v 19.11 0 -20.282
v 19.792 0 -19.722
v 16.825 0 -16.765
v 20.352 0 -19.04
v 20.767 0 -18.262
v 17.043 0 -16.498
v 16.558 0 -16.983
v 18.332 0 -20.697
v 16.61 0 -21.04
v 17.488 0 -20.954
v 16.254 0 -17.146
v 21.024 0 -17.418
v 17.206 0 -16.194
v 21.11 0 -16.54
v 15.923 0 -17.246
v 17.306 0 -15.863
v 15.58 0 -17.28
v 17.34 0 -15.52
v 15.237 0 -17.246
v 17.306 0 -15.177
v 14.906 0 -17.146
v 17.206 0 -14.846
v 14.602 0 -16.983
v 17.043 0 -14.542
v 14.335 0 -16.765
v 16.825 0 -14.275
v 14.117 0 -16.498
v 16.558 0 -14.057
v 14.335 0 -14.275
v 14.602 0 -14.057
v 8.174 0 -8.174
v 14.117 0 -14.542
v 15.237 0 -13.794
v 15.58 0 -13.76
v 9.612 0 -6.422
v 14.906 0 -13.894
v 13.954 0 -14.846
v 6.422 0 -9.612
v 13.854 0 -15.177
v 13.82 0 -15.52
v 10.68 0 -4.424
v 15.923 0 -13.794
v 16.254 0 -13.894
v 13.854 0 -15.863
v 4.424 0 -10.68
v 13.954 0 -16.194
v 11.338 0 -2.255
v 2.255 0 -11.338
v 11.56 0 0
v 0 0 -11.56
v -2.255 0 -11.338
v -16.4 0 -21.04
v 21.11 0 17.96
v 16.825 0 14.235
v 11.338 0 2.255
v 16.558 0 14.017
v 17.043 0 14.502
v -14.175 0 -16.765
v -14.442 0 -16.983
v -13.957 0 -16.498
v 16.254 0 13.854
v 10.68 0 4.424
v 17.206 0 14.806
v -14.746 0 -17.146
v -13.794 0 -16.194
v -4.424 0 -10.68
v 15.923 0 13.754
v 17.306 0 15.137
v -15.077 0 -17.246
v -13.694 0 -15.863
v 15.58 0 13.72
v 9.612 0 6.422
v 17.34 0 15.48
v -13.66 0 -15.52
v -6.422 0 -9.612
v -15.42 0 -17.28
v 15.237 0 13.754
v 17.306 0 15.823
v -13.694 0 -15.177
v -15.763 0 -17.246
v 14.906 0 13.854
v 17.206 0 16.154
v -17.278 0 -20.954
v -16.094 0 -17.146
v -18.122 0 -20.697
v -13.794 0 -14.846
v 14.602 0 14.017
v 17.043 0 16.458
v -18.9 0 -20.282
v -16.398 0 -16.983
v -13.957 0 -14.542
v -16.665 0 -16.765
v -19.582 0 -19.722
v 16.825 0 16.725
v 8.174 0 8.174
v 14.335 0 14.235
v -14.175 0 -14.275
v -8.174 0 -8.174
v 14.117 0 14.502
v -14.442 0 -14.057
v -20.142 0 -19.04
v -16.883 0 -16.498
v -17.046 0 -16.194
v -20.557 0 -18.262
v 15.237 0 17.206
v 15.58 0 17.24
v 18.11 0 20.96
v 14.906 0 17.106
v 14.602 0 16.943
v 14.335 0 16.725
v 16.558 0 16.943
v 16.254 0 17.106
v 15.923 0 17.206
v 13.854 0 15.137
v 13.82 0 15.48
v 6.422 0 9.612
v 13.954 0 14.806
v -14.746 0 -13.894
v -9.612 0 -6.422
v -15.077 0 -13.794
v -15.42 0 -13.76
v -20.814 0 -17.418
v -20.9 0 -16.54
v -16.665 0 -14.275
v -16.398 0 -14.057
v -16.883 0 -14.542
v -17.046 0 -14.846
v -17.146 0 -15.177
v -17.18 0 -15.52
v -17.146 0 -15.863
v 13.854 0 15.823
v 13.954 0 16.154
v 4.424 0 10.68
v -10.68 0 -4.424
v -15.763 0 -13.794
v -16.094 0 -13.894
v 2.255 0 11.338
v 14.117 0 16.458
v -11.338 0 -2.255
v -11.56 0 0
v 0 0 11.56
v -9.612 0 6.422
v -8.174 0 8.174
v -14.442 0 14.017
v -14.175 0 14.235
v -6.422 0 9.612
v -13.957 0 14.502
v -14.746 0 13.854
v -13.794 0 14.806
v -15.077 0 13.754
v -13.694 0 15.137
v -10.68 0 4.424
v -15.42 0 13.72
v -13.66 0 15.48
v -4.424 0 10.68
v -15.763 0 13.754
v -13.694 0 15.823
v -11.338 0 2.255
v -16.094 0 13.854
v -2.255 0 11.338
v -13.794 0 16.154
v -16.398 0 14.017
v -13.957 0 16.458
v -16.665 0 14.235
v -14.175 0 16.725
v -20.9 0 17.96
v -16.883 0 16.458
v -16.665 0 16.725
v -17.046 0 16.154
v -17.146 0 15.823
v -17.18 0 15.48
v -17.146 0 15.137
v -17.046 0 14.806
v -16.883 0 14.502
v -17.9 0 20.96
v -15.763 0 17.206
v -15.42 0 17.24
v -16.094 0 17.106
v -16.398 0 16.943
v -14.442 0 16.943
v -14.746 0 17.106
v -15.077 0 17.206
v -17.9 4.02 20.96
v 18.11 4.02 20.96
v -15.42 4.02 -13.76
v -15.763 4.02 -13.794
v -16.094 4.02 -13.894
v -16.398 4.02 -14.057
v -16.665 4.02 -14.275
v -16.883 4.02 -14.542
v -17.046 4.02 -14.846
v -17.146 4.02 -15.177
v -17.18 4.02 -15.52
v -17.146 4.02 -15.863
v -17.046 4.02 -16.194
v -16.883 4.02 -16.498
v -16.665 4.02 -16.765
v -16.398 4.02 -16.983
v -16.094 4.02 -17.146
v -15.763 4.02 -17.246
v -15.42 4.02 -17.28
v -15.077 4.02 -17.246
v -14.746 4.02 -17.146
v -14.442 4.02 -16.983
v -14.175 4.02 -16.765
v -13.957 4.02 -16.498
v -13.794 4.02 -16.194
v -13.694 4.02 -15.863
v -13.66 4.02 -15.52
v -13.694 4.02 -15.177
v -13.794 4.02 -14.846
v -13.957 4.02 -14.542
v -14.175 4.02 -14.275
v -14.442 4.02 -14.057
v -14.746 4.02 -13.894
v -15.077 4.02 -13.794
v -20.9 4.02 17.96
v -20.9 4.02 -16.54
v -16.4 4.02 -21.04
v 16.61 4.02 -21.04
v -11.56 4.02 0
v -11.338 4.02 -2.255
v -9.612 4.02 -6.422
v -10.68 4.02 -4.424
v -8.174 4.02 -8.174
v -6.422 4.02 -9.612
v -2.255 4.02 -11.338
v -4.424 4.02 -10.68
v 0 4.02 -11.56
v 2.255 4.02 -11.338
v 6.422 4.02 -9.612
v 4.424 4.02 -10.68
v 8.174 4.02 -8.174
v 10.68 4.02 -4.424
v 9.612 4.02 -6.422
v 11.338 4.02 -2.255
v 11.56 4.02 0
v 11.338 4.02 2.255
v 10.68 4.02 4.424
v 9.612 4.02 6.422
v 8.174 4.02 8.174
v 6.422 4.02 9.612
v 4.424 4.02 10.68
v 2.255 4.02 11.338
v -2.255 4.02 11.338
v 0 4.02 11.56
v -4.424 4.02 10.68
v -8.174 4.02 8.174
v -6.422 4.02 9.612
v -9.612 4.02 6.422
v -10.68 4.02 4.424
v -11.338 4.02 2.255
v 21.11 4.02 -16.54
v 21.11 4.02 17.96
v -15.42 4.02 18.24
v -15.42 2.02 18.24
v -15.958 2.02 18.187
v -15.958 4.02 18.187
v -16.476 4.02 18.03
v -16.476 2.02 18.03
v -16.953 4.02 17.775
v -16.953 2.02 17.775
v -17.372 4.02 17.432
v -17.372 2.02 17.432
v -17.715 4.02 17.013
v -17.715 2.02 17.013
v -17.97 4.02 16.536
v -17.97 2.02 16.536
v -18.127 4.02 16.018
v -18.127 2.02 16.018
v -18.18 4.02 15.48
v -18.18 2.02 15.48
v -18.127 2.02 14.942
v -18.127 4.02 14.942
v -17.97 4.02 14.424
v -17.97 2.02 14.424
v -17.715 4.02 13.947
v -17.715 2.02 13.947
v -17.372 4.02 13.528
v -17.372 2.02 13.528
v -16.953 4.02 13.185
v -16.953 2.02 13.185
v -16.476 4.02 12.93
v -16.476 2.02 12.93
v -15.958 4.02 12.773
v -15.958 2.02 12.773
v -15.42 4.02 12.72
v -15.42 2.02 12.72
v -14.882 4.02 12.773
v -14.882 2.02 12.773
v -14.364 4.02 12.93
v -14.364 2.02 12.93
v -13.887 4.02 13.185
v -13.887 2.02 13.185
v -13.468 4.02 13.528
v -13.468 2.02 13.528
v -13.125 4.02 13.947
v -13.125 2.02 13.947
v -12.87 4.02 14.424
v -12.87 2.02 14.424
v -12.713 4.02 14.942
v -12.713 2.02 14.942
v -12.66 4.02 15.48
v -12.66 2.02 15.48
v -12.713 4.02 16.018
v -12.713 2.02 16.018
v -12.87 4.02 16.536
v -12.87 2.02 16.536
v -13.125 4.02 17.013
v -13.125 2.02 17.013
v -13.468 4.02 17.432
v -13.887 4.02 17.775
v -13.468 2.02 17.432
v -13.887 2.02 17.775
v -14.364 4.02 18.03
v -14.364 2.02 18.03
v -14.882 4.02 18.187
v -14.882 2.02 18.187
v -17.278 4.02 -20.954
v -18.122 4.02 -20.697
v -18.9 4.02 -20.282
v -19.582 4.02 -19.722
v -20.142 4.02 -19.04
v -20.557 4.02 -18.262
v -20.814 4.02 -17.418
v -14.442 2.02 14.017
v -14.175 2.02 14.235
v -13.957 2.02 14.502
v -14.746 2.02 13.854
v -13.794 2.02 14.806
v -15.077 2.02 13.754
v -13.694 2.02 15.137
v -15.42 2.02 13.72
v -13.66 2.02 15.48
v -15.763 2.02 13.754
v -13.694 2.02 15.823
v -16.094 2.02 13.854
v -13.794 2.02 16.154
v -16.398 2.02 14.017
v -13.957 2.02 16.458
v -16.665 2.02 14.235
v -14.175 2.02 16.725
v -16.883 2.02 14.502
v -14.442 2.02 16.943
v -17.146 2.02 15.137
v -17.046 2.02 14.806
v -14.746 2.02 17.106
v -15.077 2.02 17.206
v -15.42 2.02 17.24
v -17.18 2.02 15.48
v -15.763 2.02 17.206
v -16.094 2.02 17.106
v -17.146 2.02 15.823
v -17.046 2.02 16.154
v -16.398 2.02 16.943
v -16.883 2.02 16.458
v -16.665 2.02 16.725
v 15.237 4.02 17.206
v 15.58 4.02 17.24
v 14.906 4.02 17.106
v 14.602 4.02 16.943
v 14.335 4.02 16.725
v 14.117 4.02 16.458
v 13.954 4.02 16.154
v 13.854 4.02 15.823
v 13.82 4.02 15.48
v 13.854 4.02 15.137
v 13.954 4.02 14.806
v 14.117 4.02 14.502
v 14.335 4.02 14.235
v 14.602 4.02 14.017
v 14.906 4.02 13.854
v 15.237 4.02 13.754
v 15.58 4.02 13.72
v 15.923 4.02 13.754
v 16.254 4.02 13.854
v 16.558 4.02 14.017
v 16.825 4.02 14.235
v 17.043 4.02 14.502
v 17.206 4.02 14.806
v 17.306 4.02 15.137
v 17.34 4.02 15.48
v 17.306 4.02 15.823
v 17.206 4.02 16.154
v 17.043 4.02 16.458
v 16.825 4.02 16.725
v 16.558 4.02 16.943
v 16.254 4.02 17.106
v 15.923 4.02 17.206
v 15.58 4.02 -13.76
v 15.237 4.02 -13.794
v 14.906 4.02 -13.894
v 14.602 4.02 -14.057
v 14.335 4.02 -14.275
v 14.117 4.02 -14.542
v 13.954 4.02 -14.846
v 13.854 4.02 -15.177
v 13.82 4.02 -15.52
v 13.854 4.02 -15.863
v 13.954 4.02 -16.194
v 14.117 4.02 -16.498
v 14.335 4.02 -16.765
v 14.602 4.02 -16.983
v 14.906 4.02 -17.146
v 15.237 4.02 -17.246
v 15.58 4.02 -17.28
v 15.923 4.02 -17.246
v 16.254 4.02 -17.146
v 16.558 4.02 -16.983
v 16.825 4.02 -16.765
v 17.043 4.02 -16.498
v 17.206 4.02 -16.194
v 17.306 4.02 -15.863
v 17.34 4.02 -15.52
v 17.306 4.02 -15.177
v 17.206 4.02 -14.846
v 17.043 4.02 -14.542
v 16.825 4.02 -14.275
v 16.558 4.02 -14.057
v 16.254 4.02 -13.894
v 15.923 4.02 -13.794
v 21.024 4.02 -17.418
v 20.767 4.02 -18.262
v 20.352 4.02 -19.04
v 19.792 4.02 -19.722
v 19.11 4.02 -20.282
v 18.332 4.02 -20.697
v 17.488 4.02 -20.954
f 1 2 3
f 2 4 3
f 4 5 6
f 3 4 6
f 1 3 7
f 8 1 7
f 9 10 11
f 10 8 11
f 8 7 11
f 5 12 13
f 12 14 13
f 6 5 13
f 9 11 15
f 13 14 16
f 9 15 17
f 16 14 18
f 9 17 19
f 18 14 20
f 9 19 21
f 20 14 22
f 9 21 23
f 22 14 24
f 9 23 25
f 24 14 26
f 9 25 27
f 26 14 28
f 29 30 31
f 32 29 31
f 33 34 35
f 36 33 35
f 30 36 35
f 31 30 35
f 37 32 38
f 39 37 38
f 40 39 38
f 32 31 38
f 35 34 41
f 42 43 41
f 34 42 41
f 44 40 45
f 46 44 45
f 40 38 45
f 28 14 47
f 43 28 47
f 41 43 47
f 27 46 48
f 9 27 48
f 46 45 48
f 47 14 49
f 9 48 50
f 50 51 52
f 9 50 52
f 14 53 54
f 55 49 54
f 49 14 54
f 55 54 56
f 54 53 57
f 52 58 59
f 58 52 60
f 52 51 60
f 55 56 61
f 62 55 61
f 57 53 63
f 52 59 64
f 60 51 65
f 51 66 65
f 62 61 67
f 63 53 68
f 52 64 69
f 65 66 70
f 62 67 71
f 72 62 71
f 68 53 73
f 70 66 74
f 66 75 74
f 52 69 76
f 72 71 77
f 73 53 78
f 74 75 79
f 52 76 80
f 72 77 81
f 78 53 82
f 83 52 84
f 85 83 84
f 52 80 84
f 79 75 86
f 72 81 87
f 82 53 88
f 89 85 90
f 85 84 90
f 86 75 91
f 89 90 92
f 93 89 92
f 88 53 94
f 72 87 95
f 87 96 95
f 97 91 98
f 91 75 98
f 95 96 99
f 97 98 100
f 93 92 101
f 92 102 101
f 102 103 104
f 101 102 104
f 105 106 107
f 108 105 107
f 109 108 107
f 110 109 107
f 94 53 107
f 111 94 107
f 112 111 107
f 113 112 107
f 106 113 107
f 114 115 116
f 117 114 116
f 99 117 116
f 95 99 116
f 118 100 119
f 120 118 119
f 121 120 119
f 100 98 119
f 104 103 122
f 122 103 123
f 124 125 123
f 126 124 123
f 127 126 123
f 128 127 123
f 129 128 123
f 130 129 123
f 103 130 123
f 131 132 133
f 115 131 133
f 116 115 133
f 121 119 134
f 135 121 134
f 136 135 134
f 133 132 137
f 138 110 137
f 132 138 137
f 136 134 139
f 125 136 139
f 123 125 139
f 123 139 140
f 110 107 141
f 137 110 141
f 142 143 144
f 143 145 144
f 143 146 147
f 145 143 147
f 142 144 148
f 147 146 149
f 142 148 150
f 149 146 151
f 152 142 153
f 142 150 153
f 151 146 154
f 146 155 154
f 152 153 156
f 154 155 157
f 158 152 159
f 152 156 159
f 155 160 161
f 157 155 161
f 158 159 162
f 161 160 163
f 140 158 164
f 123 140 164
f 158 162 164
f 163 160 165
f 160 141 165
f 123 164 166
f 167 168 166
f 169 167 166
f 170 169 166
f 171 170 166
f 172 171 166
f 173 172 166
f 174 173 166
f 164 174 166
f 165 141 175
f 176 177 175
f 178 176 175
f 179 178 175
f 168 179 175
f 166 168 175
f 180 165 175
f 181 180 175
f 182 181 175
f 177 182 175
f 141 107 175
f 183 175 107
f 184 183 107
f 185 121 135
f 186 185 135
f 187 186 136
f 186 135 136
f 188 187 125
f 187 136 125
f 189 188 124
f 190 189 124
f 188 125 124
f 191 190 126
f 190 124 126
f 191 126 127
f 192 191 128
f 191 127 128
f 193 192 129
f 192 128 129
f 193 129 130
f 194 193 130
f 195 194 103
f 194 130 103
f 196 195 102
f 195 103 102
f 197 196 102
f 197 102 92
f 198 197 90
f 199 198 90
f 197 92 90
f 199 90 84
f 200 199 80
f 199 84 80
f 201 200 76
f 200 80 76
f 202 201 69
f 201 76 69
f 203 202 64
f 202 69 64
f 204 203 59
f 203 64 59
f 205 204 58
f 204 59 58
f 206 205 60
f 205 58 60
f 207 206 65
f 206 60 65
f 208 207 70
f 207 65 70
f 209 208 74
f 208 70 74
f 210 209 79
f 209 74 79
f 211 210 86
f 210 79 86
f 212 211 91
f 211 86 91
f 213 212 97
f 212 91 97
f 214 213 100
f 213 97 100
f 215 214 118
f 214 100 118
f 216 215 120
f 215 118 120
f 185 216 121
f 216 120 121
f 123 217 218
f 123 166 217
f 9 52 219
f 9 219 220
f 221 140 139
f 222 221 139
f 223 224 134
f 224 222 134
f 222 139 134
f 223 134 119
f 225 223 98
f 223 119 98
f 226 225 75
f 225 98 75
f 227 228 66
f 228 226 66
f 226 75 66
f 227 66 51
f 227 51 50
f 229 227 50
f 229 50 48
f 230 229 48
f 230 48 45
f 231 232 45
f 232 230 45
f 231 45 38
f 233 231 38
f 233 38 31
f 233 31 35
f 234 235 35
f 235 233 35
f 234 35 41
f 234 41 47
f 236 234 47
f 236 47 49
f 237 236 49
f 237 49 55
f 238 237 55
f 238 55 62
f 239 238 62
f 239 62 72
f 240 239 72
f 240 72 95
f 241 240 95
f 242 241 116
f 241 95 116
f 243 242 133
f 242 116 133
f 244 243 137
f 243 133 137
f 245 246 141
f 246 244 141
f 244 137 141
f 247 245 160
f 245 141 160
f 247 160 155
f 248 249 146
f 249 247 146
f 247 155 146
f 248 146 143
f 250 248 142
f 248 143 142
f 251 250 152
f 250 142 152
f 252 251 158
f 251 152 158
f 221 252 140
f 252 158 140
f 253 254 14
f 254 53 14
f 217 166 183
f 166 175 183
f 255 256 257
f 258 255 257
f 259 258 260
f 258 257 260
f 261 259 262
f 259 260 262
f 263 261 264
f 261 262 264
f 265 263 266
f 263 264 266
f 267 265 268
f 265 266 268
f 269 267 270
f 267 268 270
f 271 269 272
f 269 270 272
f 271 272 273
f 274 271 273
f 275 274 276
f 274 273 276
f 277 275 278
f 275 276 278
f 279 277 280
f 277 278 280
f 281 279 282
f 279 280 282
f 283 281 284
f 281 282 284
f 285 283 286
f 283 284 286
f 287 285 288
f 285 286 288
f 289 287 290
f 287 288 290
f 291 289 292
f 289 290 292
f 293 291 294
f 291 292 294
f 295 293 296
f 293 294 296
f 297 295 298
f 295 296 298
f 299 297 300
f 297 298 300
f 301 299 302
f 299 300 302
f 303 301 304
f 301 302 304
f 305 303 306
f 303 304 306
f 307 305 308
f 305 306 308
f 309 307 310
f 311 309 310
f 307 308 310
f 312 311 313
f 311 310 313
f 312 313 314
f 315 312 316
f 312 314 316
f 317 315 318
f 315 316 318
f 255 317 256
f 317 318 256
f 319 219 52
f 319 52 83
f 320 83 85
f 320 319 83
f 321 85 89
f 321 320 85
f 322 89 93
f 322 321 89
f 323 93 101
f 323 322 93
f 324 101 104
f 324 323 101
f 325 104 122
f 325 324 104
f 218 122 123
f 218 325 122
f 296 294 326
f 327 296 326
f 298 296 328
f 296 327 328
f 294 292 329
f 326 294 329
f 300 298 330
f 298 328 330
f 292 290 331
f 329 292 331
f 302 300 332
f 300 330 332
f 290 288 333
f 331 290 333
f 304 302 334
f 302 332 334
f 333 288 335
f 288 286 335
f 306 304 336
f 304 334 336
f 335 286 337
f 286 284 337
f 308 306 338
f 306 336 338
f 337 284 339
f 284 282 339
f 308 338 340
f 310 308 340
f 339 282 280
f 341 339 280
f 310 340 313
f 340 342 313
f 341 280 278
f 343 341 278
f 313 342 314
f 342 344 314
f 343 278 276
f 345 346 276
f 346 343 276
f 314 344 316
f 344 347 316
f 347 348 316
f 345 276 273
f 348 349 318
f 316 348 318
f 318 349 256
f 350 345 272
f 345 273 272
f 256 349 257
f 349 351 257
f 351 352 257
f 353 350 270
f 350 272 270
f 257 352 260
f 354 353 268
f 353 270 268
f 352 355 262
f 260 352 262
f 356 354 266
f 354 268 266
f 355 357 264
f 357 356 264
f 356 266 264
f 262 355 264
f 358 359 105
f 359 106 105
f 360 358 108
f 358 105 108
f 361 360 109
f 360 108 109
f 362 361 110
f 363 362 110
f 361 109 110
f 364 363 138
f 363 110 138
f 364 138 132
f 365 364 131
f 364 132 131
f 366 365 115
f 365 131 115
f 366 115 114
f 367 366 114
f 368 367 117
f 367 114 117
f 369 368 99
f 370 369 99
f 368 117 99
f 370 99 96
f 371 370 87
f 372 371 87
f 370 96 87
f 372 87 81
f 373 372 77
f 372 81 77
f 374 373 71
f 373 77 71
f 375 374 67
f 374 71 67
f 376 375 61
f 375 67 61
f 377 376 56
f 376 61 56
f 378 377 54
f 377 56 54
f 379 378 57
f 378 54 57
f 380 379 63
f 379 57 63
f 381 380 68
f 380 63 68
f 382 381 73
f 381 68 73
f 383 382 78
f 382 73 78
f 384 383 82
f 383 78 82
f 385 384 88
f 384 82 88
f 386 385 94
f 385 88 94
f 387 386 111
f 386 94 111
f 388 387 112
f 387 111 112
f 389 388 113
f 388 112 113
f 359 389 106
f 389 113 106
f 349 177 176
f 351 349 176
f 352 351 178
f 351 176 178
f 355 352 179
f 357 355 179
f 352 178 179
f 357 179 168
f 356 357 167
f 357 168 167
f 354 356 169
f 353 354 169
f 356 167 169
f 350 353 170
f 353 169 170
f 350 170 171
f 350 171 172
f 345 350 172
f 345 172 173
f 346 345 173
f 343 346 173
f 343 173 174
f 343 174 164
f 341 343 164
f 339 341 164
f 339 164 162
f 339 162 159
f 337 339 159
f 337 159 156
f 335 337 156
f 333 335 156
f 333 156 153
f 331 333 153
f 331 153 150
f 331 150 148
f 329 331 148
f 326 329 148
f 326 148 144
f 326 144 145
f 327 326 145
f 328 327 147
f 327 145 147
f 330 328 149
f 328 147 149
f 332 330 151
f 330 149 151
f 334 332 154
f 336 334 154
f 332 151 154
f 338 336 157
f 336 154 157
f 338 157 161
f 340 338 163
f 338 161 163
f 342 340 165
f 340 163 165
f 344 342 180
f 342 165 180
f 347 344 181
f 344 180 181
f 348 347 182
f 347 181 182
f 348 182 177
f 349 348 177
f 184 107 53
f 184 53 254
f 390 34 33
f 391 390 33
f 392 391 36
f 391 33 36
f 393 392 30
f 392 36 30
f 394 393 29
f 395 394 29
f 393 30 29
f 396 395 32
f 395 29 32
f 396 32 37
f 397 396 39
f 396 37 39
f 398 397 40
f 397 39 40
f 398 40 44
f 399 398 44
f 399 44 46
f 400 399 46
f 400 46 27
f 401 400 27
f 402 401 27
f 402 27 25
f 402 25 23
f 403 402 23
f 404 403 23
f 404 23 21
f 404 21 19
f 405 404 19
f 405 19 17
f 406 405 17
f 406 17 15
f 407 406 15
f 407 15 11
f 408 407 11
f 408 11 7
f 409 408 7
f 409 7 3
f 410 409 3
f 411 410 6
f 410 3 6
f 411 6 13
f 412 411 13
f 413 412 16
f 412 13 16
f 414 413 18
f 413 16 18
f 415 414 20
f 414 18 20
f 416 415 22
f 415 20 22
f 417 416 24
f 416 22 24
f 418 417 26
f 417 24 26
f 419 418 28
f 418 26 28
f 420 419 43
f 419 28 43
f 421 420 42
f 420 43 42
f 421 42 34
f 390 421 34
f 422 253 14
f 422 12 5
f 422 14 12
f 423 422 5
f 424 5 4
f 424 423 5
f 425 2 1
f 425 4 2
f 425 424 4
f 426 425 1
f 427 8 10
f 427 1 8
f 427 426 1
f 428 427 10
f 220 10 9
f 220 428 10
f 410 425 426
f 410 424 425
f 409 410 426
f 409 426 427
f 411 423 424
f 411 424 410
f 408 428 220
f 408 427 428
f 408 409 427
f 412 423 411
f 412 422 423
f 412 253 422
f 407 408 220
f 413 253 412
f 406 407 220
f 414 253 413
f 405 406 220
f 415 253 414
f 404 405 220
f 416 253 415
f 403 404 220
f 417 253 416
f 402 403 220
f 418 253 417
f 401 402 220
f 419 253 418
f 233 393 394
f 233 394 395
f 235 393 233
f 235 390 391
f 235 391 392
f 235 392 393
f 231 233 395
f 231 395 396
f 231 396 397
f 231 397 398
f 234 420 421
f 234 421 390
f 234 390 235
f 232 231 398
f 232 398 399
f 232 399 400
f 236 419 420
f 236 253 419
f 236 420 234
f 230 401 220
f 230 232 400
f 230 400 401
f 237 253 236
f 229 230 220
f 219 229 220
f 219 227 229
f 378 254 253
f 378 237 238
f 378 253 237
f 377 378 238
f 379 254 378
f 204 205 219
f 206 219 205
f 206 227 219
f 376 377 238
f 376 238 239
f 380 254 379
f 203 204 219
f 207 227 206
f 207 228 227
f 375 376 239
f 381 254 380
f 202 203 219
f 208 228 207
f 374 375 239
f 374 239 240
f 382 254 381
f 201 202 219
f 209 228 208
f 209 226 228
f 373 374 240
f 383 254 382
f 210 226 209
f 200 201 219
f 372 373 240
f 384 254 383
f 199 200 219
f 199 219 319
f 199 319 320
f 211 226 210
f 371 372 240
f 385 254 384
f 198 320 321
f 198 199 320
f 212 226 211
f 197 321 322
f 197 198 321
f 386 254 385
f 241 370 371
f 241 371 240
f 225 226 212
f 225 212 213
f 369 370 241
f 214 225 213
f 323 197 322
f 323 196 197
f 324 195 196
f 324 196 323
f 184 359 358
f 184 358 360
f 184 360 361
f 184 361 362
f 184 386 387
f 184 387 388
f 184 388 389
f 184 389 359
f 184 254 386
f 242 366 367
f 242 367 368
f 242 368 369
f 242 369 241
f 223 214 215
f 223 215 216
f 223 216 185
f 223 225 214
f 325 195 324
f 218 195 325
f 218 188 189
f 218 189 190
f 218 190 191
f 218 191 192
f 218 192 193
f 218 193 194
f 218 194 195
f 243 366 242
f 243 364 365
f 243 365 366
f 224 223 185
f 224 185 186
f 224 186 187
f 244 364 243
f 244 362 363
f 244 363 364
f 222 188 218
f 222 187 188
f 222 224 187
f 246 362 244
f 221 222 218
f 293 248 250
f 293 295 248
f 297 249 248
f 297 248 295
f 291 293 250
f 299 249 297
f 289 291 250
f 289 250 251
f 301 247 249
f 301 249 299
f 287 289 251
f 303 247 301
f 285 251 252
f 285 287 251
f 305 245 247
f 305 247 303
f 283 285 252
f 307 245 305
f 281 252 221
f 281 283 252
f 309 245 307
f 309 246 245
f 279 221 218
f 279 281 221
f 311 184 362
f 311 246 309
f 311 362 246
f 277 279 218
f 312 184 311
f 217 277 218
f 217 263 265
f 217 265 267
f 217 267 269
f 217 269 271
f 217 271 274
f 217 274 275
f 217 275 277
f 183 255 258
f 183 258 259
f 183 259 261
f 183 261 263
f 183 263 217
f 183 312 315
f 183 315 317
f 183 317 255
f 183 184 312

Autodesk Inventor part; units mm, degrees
ref_plane "YZ Plane" through (0, 0, 0) normal (1, 0, 0) x (0, 1, 0)
ref_plane "XZ Plane" through (0, 0, 0) normal (0, 1, 0) x (-1, 0, 0)
ref_plane "XY Plane" through (0, 0, 0) normal (0, 0, 1) x (1, 0, 0)
sketch "Sketch1" plane through (0, 0, 0) normal (0, 1, 0) x (-1, 0, 0)
  circle A0 centre (0, 0) radius 11.56
  line L0 (20.9, -21.04) -> (-21.11, -21.04)
  line L1 (20.9, 20.96) -> (-21.11, 20.96)
  line L2 (20.9, 20.96) -> (20.9, -21.04)
  line L3 (-21.11, 20.96) -> (-21.11, -21.04)
  dimension "d1" = 23.12
  dimension "d2" = 21.04
  dimension "d3" = 20.9
  dimension "d4" = 20.96
  dimension "d5" = 21.11
extrude "Extrusion1" add sketch "Sketch1" along normal blind 4.02
sketch "Sketch2" plane through (0, 4.02, 0) normal (0, 1, 0) x (1, 0, 0)
  point P0 (0, 0)
  point P1 (15.58, -15.48)
  point P2 (15.58, 15.52)
  point P3 (-15.42, 15.52)
  point P4 (-15.42, -15.48)
  dimension "d8" = 15.52
  dimension "d9" = 15.48
  dimension "d10" = 15.42
  dimension "d11" = 15.58
hole "Hole1" at (15.58, 4.02, 15.48) at (15.58, 4.02, -15.52) at (-15.42, 4.02, -15.52) direction (0, -1, 0) diameter 3.52 end through all
hole "Hole2" at (-15.42, 4.02, 15.48) direction (0, -1, 0) diameter 3.52 end through all counterbore diameter 5.52 counterbore depth 2
fillet "Fillet1" radius 4.5 2 edges at (-20.9, 2.01, -21.04) (21.11, 2.01, -21.04)
chamfer "Chamfer1" distance 3 angle 45 2 edges at (-20.9, 2.01, 20.96) (21.11, 2.01, 20.96)
properties part number "Extruder Housing"
